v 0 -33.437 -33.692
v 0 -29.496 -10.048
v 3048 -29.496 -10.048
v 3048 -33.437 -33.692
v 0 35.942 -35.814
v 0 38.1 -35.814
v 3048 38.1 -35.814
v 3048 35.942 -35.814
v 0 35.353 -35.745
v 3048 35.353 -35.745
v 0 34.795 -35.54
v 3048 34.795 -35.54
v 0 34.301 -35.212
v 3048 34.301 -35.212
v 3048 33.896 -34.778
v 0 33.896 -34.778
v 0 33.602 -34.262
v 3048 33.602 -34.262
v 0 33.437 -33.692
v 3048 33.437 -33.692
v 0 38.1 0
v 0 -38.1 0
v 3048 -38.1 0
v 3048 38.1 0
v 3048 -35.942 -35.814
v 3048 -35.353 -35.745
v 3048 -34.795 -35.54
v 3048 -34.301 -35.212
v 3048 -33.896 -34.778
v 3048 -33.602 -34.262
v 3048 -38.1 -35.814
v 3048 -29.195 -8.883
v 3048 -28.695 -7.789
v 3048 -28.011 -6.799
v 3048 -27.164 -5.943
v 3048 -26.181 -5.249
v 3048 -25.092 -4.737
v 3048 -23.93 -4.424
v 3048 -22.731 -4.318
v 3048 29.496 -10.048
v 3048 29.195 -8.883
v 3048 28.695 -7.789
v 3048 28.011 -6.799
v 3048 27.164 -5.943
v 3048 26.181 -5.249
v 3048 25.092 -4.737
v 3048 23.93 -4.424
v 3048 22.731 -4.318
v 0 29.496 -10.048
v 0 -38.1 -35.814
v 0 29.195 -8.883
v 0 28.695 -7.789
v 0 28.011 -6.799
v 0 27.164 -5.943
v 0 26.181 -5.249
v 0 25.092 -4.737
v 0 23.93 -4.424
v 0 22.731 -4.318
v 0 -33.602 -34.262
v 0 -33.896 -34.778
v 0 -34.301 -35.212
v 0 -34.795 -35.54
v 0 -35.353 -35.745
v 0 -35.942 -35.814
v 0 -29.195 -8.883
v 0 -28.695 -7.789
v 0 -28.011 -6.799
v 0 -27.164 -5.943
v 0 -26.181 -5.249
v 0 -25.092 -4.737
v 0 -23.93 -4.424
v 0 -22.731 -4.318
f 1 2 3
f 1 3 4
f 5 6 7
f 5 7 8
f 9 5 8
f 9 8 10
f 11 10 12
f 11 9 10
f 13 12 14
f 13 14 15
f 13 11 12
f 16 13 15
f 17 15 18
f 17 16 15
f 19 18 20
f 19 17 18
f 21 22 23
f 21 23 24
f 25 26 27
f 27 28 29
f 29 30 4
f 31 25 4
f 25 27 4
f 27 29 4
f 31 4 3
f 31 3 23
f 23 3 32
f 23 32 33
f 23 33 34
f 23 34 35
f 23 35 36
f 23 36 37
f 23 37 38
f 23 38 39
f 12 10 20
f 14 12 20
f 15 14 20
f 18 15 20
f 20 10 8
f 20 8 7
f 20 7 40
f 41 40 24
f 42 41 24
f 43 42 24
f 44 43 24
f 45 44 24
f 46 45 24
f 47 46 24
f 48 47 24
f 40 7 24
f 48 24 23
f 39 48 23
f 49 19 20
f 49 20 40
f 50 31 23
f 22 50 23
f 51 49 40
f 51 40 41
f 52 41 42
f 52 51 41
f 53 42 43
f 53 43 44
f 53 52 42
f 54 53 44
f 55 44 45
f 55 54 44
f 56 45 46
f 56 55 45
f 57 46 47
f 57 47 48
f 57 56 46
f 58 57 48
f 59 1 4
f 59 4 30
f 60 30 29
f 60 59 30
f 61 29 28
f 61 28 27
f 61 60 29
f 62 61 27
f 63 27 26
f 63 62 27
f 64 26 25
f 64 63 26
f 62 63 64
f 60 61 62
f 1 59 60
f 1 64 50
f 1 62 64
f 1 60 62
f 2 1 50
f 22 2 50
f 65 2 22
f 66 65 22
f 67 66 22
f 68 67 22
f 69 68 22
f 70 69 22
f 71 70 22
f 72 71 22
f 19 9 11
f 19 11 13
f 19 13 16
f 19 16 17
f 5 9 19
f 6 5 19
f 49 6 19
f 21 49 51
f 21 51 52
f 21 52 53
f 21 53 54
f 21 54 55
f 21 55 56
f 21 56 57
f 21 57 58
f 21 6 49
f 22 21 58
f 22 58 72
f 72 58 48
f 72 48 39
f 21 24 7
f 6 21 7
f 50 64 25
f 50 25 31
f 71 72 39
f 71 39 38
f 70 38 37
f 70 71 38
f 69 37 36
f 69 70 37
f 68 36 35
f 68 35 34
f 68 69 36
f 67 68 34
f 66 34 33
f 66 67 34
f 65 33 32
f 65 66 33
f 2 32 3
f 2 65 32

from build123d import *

# Parameters (mm, degrees)
C_CHANNEL_C3X4_1_1_DEPTH = 3048


with BuildPart() as part:
    # Sketch11 → C channel C3X4.1(1) (new body)
    with BuildSketch(Plane(origin=(0, -38.1, 0), x_dir=(0, 0, -1), z_dir=(1, 0, 0))):
        with BuildLine():
            Line((0, 0), (0, 76.2))
            Line((0, 76.2), (35.814, 76.2))
            Line((35.814, 76.2), (35.814, 74.042335136))
            ThreePointArc((35.814, 74.042335136), (35.212080466, 72.400554363), (33.691603066, 71.536899509))
            Line((33.691603066, 71.536899509), (10.048471721, 67.596090157))
            ThreePointArc((10.048471721, 67.596090157), (5.943182741, 65.264222052), (4.318, 60.831413966))
            Line((4.318, 60.831413966), (4.318, 15.368586034))
            ThreePointArc((4.318, 15.368586034), (5.943182741, 10.935777948), (10.048471721, 8.603909843))
            Line((10.048471721, 8.603909843), (33.691603066, 4.663100491))
            ThreePointArc((33.691603066, 4.663100491), (35.212080466, 3.799445637), (35.814, 2.157664864))
            Line((35.814, 2.157664864), (35.814, 0))
            Line((35.814, 0), (0, 0))
        make_face()
    extrude(amount=C_CHANNEL_C3X4_1_1_DEPTH)


solid = part.part
